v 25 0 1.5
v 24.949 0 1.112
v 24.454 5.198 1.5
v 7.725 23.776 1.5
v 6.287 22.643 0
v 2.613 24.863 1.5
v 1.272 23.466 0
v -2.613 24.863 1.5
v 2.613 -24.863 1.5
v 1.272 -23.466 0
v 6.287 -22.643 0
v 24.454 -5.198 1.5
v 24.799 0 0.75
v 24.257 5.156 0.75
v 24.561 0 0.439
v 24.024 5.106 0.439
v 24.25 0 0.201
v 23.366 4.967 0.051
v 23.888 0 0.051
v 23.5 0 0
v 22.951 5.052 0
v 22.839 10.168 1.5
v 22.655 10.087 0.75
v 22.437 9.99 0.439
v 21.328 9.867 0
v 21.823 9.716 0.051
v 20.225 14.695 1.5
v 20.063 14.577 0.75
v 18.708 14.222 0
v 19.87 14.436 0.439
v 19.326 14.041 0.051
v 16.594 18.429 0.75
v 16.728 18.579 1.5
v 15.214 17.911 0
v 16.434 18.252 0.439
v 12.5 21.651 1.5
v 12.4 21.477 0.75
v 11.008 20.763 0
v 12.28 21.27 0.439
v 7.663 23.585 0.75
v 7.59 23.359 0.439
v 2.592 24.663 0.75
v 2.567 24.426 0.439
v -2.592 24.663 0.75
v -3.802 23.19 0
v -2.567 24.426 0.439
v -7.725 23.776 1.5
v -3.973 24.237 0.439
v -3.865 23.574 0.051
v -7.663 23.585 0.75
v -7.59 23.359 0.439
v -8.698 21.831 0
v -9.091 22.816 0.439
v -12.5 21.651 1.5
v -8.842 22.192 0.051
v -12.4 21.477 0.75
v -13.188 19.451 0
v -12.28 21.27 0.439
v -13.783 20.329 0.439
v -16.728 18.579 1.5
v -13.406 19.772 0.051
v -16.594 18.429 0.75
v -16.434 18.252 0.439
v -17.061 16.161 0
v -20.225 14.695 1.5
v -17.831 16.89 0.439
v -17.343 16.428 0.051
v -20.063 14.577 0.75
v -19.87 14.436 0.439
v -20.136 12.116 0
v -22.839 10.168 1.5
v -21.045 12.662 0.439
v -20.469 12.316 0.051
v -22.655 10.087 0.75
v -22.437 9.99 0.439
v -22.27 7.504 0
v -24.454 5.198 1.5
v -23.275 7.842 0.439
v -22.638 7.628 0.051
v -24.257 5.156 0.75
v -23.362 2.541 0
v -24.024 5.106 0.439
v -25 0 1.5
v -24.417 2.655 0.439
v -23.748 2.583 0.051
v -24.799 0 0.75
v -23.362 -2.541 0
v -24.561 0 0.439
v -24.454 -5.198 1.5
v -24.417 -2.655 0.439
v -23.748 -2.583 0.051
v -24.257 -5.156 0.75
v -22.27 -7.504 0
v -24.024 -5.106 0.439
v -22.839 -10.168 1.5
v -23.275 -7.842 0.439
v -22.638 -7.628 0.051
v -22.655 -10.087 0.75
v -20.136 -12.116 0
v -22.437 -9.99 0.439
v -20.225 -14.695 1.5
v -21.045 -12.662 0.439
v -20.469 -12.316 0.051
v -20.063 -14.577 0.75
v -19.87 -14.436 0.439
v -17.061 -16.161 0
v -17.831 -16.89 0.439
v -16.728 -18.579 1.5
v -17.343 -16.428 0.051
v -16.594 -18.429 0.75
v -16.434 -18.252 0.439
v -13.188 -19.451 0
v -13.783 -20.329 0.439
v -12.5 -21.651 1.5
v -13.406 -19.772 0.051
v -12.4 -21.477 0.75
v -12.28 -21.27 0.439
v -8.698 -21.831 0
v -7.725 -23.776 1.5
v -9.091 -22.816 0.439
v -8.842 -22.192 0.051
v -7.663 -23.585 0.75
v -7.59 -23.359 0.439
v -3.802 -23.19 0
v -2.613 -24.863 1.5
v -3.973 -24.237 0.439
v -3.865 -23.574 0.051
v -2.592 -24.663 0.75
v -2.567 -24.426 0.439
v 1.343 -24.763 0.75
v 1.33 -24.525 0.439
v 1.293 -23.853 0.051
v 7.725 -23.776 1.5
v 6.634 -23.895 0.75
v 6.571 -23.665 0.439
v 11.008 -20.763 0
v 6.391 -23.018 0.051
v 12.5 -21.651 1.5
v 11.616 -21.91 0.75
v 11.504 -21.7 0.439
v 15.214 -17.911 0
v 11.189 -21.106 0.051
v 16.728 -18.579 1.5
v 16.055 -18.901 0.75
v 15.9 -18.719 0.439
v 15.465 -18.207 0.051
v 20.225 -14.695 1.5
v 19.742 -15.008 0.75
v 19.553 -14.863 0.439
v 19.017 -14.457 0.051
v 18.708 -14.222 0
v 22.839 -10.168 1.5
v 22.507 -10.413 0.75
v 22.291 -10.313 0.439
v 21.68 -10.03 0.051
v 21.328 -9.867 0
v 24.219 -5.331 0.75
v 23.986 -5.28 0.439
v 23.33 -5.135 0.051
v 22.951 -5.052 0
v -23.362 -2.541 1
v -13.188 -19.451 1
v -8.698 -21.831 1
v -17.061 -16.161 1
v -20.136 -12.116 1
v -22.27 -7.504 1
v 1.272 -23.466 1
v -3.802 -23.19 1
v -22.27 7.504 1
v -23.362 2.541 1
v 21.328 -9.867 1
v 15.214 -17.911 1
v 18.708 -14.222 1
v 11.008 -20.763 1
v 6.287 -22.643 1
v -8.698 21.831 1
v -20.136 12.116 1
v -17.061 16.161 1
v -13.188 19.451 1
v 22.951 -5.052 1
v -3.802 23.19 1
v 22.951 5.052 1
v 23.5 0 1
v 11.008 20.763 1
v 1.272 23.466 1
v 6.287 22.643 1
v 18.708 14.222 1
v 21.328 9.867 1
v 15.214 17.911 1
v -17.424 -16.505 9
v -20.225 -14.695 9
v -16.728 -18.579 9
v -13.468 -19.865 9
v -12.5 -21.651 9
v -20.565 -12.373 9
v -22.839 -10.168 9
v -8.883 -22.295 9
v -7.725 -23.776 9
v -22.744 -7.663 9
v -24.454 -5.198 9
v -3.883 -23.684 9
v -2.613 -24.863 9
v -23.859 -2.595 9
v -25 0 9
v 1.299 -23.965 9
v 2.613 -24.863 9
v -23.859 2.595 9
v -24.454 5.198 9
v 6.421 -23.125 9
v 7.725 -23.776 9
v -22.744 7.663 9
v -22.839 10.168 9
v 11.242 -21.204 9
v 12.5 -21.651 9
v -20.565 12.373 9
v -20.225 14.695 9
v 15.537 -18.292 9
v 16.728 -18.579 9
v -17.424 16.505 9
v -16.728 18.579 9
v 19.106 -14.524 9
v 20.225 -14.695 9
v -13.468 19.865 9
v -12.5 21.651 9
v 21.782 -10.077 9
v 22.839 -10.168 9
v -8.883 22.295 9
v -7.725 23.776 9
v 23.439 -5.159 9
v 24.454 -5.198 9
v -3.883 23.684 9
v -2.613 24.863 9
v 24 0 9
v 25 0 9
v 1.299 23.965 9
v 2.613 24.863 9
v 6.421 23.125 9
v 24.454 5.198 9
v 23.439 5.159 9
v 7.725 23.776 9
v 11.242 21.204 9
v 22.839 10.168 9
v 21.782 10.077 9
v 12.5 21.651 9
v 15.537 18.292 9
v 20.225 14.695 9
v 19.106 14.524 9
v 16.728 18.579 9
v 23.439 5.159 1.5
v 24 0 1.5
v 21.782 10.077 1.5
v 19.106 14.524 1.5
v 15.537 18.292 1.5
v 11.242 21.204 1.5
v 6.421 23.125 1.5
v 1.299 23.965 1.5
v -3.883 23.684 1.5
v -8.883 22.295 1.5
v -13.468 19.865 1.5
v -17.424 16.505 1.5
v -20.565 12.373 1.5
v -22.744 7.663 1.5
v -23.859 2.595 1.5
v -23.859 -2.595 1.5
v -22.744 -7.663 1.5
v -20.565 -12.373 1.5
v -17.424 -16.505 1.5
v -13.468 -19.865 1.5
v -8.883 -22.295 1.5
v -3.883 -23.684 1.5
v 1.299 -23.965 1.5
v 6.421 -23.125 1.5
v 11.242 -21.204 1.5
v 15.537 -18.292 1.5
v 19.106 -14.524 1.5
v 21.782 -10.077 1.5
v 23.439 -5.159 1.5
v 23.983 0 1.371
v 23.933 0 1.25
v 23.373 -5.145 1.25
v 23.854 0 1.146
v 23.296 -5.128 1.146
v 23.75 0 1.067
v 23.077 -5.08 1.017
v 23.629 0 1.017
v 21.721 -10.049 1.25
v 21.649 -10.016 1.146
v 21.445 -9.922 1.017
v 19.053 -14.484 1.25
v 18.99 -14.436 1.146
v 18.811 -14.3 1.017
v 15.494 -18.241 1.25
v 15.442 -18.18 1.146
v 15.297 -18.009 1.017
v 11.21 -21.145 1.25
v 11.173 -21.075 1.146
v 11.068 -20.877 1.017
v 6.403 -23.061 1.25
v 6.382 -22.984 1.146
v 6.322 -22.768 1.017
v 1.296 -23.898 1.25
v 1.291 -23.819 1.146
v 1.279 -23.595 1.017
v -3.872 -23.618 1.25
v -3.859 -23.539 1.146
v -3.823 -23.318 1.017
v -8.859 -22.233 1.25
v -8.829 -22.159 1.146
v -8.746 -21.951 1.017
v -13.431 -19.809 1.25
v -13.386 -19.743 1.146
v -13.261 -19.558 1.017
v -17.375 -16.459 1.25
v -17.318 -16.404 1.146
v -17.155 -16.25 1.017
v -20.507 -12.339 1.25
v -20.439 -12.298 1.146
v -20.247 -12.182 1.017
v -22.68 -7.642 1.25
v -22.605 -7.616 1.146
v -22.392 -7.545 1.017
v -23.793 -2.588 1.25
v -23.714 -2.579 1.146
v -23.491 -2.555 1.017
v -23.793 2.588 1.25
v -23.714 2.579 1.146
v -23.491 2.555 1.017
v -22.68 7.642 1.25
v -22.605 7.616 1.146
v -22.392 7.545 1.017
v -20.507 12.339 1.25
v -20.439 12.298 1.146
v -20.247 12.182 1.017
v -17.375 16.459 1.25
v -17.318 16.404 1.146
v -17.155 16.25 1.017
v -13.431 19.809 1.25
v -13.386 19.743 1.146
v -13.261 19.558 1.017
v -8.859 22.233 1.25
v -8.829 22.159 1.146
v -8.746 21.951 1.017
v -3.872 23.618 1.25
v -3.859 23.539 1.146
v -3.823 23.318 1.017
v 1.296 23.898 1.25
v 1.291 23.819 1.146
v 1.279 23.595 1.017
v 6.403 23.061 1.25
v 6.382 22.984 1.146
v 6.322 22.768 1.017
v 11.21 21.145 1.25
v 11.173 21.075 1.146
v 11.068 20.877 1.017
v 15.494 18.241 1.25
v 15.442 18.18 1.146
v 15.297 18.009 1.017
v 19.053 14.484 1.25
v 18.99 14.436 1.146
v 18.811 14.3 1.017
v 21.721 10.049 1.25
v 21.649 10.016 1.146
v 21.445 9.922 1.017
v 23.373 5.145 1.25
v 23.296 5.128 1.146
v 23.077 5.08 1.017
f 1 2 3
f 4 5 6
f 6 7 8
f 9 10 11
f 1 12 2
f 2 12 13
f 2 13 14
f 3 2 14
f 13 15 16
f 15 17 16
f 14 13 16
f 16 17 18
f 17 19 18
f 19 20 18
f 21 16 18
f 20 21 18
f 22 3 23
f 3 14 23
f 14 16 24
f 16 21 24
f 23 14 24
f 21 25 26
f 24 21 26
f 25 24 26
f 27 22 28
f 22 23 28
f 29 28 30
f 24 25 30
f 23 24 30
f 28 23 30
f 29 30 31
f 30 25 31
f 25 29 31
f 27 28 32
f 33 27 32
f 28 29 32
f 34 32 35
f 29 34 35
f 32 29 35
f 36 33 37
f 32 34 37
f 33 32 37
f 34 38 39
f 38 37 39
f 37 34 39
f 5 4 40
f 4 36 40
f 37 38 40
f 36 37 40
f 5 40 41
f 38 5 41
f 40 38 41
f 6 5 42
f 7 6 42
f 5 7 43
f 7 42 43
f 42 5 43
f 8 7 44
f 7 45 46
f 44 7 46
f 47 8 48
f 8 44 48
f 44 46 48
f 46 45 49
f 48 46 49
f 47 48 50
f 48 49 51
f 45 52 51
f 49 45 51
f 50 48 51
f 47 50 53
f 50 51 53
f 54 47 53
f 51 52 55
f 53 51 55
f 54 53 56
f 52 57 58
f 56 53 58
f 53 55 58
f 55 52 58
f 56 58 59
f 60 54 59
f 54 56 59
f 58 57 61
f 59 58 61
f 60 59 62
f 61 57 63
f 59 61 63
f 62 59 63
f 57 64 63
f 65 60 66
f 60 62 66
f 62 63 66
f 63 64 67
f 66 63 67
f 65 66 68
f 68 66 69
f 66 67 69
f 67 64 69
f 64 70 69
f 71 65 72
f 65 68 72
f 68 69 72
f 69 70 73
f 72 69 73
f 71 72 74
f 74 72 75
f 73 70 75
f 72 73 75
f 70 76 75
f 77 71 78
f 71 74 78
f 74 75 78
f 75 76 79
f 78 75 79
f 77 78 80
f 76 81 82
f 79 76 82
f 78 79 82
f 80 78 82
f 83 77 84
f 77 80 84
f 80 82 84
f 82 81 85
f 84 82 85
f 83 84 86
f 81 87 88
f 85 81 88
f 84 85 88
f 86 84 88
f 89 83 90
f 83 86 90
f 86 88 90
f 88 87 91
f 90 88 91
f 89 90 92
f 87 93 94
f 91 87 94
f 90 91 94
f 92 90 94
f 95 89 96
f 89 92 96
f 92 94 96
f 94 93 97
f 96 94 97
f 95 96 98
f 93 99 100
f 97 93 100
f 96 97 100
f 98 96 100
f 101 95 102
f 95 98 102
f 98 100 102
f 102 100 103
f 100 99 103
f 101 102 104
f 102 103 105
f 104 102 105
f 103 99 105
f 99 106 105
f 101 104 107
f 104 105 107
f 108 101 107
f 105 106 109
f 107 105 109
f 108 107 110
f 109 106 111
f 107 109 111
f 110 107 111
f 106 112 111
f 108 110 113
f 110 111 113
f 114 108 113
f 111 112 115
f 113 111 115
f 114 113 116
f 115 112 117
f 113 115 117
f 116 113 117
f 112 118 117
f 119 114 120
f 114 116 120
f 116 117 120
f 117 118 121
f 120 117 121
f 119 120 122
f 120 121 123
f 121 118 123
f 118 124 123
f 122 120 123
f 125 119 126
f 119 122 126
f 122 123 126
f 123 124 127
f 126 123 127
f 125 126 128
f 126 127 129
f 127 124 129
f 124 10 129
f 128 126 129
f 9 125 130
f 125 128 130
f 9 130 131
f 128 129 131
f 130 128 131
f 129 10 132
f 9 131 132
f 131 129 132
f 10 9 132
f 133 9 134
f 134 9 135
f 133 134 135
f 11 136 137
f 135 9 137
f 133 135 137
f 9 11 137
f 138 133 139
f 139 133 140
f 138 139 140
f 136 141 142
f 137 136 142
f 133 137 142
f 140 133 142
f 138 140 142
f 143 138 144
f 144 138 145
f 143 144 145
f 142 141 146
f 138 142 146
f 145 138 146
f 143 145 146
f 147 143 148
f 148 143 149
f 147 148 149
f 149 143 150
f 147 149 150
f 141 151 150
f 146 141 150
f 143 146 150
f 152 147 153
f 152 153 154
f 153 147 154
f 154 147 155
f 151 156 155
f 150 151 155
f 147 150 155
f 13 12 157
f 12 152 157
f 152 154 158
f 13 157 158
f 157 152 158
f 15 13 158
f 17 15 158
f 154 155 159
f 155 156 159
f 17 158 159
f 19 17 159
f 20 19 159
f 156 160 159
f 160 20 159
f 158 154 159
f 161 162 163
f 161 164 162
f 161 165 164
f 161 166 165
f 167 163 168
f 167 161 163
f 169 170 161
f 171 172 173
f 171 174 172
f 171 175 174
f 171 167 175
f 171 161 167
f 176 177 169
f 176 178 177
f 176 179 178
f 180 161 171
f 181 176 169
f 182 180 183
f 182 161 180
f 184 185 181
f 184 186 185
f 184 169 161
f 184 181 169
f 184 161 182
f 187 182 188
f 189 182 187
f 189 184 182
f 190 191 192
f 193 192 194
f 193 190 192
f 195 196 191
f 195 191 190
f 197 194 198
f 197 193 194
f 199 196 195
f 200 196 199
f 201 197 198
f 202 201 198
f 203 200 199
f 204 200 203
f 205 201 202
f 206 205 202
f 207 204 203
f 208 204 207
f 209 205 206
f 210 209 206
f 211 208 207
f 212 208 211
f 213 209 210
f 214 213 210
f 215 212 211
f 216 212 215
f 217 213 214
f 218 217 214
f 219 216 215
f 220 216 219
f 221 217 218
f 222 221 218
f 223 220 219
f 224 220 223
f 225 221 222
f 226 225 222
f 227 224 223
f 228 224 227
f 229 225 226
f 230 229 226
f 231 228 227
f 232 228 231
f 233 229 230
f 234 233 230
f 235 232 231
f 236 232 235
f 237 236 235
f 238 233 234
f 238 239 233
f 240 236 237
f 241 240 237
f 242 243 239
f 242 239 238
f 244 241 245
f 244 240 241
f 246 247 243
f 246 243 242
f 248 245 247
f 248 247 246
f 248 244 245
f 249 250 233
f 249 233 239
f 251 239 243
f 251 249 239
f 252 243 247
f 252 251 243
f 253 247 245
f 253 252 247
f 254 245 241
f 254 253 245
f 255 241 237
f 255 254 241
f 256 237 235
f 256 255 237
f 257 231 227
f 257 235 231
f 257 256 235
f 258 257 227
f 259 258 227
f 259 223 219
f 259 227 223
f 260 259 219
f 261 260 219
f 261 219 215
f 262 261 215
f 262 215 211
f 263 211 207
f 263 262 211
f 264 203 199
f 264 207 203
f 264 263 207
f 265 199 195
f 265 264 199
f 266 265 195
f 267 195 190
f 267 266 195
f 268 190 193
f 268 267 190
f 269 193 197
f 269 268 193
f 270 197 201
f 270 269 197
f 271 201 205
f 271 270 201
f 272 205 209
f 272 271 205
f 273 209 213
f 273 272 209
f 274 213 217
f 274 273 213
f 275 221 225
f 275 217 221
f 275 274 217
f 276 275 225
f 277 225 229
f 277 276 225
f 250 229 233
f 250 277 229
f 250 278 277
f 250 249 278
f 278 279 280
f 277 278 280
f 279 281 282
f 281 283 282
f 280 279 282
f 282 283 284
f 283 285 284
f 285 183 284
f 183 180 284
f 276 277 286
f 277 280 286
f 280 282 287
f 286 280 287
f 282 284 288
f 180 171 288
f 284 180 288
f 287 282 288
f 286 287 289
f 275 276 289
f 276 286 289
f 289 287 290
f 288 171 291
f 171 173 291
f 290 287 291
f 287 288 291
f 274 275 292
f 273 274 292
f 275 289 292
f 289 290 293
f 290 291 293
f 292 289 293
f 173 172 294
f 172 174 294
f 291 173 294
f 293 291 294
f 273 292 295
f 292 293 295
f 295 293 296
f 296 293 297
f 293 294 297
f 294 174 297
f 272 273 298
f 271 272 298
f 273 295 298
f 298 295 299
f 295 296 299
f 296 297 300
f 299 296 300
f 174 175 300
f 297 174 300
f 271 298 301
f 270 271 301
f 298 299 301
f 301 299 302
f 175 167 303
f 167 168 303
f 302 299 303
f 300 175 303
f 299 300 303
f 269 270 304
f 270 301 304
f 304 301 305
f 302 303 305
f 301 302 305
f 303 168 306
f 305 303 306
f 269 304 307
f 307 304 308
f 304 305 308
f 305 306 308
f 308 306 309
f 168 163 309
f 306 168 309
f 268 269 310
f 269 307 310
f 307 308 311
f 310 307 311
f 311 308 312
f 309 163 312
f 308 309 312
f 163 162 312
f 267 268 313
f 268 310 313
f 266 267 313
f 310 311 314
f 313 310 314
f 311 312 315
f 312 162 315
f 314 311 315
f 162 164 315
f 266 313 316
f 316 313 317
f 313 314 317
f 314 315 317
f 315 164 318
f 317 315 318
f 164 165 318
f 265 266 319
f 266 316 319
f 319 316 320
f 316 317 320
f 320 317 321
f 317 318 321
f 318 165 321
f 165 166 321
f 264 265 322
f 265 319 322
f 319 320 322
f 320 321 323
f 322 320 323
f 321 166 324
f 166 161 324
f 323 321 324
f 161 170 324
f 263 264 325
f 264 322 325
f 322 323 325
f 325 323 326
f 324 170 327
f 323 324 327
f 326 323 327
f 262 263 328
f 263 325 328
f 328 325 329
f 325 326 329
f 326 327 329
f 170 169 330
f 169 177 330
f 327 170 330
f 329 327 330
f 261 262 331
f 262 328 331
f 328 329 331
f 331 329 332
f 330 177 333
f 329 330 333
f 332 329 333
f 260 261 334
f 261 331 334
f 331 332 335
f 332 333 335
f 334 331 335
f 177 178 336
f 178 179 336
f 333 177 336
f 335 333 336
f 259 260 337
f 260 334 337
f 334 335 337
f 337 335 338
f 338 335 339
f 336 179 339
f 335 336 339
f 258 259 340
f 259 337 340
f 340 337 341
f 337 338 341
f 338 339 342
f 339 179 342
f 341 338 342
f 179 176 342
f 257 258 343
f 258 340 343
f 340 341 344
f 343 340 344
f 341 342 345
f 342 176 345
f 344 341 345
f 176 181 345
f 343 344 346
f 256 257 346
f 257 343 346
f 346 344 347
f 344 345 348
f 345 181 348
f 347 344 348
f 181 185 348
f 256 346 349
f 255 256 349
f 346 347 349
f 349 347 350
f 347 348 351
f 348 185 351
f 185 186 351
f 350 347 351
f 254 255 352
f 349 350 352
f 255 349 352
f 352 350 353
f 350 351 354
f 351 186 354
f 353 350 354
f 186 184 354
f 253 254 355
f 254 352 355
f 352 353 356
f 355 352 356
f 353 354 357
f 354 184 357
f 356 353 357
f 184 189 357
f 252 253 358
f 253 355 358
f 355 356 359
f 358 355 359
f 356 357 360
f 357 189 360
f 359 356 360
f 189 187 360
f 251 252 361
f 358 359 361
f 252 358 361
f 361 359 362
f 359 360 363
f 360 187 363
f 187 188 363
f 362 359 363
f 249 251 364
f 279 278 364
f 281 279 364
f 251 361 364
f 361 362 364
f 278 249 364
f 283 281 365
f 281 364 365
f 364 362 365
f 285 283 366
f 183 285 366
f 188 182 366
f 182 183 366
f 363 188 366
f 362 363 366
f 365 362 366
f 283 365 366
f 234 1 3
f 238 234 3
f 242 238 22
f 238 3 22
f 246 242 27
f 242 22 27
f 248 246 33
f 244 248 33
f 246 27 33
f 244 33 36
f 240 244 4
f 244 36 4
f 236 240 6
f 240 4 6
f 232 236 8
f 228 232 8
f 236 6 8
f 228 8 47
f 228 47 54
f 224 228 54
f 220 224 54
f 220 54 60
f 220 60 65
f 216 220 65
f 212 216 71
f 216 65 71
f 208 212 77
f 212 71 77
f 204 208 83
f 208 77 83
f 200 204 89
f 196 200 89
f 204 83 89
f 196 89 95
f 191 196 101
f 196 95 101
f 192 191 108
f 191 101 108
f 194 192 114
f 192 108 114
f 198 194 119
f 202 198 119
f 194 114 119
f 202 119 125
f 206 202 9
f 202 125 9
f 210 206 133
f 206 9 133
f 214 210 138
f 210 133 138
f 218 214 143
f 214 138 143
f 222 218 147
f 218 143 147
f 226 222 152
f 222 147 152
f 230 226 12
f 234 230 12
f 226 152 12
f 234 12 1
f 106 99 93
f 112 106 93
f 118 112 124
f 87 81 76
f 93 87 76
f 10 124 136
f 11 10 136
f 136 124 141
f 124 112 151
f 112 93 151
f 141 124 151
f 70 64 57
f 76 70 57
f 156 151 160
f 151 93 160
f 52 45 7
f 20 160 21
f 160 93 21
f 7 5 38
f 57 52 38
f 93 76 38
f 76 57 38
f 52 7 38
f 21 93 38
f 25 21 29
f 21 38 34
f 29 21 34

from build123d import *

# Parameters (mm, degrees)
SKETCH1_R           = 25
BOSS_EXTRUDE1_DEPTH = 9
SHELL1_T            = -1
FILLET1_R           = 0.5
FILLET2_R           = 1.5


with BuildPart() as part:
    # Sketch1 → Boss-Extrude1 (new body)
    with BuildSketch(Plane.XY):
        Circle(SKETCH1_R)
    extrude(amount=BOSS_EXTRUDE1_DEPTH)

    # Shell1
    shell1_openings = [part.faces().sort_by_distance(p)[0] for p in [
        (0, 0, 9),
    ]]
    offset(amount=SHELL1_T, openings=shell1_openings, kind=Kind.INTERSECTION)

    # Fillet1
    fillet1_edges = [part.edges().sort_by_distance(p)[0] for p in [
        (-24, 0, 1),
    ]]
    fillet(fillet1_edges, radius=FILLET1_R)

    # Fillet2
    fillet2_edges = [part.edges().sort_by_distance(p)[0] for p in [
        (-25, 0, 0),
    ]]
    fillet(fillet2_edges, radius=FILLET2_R)


solid = part.part
